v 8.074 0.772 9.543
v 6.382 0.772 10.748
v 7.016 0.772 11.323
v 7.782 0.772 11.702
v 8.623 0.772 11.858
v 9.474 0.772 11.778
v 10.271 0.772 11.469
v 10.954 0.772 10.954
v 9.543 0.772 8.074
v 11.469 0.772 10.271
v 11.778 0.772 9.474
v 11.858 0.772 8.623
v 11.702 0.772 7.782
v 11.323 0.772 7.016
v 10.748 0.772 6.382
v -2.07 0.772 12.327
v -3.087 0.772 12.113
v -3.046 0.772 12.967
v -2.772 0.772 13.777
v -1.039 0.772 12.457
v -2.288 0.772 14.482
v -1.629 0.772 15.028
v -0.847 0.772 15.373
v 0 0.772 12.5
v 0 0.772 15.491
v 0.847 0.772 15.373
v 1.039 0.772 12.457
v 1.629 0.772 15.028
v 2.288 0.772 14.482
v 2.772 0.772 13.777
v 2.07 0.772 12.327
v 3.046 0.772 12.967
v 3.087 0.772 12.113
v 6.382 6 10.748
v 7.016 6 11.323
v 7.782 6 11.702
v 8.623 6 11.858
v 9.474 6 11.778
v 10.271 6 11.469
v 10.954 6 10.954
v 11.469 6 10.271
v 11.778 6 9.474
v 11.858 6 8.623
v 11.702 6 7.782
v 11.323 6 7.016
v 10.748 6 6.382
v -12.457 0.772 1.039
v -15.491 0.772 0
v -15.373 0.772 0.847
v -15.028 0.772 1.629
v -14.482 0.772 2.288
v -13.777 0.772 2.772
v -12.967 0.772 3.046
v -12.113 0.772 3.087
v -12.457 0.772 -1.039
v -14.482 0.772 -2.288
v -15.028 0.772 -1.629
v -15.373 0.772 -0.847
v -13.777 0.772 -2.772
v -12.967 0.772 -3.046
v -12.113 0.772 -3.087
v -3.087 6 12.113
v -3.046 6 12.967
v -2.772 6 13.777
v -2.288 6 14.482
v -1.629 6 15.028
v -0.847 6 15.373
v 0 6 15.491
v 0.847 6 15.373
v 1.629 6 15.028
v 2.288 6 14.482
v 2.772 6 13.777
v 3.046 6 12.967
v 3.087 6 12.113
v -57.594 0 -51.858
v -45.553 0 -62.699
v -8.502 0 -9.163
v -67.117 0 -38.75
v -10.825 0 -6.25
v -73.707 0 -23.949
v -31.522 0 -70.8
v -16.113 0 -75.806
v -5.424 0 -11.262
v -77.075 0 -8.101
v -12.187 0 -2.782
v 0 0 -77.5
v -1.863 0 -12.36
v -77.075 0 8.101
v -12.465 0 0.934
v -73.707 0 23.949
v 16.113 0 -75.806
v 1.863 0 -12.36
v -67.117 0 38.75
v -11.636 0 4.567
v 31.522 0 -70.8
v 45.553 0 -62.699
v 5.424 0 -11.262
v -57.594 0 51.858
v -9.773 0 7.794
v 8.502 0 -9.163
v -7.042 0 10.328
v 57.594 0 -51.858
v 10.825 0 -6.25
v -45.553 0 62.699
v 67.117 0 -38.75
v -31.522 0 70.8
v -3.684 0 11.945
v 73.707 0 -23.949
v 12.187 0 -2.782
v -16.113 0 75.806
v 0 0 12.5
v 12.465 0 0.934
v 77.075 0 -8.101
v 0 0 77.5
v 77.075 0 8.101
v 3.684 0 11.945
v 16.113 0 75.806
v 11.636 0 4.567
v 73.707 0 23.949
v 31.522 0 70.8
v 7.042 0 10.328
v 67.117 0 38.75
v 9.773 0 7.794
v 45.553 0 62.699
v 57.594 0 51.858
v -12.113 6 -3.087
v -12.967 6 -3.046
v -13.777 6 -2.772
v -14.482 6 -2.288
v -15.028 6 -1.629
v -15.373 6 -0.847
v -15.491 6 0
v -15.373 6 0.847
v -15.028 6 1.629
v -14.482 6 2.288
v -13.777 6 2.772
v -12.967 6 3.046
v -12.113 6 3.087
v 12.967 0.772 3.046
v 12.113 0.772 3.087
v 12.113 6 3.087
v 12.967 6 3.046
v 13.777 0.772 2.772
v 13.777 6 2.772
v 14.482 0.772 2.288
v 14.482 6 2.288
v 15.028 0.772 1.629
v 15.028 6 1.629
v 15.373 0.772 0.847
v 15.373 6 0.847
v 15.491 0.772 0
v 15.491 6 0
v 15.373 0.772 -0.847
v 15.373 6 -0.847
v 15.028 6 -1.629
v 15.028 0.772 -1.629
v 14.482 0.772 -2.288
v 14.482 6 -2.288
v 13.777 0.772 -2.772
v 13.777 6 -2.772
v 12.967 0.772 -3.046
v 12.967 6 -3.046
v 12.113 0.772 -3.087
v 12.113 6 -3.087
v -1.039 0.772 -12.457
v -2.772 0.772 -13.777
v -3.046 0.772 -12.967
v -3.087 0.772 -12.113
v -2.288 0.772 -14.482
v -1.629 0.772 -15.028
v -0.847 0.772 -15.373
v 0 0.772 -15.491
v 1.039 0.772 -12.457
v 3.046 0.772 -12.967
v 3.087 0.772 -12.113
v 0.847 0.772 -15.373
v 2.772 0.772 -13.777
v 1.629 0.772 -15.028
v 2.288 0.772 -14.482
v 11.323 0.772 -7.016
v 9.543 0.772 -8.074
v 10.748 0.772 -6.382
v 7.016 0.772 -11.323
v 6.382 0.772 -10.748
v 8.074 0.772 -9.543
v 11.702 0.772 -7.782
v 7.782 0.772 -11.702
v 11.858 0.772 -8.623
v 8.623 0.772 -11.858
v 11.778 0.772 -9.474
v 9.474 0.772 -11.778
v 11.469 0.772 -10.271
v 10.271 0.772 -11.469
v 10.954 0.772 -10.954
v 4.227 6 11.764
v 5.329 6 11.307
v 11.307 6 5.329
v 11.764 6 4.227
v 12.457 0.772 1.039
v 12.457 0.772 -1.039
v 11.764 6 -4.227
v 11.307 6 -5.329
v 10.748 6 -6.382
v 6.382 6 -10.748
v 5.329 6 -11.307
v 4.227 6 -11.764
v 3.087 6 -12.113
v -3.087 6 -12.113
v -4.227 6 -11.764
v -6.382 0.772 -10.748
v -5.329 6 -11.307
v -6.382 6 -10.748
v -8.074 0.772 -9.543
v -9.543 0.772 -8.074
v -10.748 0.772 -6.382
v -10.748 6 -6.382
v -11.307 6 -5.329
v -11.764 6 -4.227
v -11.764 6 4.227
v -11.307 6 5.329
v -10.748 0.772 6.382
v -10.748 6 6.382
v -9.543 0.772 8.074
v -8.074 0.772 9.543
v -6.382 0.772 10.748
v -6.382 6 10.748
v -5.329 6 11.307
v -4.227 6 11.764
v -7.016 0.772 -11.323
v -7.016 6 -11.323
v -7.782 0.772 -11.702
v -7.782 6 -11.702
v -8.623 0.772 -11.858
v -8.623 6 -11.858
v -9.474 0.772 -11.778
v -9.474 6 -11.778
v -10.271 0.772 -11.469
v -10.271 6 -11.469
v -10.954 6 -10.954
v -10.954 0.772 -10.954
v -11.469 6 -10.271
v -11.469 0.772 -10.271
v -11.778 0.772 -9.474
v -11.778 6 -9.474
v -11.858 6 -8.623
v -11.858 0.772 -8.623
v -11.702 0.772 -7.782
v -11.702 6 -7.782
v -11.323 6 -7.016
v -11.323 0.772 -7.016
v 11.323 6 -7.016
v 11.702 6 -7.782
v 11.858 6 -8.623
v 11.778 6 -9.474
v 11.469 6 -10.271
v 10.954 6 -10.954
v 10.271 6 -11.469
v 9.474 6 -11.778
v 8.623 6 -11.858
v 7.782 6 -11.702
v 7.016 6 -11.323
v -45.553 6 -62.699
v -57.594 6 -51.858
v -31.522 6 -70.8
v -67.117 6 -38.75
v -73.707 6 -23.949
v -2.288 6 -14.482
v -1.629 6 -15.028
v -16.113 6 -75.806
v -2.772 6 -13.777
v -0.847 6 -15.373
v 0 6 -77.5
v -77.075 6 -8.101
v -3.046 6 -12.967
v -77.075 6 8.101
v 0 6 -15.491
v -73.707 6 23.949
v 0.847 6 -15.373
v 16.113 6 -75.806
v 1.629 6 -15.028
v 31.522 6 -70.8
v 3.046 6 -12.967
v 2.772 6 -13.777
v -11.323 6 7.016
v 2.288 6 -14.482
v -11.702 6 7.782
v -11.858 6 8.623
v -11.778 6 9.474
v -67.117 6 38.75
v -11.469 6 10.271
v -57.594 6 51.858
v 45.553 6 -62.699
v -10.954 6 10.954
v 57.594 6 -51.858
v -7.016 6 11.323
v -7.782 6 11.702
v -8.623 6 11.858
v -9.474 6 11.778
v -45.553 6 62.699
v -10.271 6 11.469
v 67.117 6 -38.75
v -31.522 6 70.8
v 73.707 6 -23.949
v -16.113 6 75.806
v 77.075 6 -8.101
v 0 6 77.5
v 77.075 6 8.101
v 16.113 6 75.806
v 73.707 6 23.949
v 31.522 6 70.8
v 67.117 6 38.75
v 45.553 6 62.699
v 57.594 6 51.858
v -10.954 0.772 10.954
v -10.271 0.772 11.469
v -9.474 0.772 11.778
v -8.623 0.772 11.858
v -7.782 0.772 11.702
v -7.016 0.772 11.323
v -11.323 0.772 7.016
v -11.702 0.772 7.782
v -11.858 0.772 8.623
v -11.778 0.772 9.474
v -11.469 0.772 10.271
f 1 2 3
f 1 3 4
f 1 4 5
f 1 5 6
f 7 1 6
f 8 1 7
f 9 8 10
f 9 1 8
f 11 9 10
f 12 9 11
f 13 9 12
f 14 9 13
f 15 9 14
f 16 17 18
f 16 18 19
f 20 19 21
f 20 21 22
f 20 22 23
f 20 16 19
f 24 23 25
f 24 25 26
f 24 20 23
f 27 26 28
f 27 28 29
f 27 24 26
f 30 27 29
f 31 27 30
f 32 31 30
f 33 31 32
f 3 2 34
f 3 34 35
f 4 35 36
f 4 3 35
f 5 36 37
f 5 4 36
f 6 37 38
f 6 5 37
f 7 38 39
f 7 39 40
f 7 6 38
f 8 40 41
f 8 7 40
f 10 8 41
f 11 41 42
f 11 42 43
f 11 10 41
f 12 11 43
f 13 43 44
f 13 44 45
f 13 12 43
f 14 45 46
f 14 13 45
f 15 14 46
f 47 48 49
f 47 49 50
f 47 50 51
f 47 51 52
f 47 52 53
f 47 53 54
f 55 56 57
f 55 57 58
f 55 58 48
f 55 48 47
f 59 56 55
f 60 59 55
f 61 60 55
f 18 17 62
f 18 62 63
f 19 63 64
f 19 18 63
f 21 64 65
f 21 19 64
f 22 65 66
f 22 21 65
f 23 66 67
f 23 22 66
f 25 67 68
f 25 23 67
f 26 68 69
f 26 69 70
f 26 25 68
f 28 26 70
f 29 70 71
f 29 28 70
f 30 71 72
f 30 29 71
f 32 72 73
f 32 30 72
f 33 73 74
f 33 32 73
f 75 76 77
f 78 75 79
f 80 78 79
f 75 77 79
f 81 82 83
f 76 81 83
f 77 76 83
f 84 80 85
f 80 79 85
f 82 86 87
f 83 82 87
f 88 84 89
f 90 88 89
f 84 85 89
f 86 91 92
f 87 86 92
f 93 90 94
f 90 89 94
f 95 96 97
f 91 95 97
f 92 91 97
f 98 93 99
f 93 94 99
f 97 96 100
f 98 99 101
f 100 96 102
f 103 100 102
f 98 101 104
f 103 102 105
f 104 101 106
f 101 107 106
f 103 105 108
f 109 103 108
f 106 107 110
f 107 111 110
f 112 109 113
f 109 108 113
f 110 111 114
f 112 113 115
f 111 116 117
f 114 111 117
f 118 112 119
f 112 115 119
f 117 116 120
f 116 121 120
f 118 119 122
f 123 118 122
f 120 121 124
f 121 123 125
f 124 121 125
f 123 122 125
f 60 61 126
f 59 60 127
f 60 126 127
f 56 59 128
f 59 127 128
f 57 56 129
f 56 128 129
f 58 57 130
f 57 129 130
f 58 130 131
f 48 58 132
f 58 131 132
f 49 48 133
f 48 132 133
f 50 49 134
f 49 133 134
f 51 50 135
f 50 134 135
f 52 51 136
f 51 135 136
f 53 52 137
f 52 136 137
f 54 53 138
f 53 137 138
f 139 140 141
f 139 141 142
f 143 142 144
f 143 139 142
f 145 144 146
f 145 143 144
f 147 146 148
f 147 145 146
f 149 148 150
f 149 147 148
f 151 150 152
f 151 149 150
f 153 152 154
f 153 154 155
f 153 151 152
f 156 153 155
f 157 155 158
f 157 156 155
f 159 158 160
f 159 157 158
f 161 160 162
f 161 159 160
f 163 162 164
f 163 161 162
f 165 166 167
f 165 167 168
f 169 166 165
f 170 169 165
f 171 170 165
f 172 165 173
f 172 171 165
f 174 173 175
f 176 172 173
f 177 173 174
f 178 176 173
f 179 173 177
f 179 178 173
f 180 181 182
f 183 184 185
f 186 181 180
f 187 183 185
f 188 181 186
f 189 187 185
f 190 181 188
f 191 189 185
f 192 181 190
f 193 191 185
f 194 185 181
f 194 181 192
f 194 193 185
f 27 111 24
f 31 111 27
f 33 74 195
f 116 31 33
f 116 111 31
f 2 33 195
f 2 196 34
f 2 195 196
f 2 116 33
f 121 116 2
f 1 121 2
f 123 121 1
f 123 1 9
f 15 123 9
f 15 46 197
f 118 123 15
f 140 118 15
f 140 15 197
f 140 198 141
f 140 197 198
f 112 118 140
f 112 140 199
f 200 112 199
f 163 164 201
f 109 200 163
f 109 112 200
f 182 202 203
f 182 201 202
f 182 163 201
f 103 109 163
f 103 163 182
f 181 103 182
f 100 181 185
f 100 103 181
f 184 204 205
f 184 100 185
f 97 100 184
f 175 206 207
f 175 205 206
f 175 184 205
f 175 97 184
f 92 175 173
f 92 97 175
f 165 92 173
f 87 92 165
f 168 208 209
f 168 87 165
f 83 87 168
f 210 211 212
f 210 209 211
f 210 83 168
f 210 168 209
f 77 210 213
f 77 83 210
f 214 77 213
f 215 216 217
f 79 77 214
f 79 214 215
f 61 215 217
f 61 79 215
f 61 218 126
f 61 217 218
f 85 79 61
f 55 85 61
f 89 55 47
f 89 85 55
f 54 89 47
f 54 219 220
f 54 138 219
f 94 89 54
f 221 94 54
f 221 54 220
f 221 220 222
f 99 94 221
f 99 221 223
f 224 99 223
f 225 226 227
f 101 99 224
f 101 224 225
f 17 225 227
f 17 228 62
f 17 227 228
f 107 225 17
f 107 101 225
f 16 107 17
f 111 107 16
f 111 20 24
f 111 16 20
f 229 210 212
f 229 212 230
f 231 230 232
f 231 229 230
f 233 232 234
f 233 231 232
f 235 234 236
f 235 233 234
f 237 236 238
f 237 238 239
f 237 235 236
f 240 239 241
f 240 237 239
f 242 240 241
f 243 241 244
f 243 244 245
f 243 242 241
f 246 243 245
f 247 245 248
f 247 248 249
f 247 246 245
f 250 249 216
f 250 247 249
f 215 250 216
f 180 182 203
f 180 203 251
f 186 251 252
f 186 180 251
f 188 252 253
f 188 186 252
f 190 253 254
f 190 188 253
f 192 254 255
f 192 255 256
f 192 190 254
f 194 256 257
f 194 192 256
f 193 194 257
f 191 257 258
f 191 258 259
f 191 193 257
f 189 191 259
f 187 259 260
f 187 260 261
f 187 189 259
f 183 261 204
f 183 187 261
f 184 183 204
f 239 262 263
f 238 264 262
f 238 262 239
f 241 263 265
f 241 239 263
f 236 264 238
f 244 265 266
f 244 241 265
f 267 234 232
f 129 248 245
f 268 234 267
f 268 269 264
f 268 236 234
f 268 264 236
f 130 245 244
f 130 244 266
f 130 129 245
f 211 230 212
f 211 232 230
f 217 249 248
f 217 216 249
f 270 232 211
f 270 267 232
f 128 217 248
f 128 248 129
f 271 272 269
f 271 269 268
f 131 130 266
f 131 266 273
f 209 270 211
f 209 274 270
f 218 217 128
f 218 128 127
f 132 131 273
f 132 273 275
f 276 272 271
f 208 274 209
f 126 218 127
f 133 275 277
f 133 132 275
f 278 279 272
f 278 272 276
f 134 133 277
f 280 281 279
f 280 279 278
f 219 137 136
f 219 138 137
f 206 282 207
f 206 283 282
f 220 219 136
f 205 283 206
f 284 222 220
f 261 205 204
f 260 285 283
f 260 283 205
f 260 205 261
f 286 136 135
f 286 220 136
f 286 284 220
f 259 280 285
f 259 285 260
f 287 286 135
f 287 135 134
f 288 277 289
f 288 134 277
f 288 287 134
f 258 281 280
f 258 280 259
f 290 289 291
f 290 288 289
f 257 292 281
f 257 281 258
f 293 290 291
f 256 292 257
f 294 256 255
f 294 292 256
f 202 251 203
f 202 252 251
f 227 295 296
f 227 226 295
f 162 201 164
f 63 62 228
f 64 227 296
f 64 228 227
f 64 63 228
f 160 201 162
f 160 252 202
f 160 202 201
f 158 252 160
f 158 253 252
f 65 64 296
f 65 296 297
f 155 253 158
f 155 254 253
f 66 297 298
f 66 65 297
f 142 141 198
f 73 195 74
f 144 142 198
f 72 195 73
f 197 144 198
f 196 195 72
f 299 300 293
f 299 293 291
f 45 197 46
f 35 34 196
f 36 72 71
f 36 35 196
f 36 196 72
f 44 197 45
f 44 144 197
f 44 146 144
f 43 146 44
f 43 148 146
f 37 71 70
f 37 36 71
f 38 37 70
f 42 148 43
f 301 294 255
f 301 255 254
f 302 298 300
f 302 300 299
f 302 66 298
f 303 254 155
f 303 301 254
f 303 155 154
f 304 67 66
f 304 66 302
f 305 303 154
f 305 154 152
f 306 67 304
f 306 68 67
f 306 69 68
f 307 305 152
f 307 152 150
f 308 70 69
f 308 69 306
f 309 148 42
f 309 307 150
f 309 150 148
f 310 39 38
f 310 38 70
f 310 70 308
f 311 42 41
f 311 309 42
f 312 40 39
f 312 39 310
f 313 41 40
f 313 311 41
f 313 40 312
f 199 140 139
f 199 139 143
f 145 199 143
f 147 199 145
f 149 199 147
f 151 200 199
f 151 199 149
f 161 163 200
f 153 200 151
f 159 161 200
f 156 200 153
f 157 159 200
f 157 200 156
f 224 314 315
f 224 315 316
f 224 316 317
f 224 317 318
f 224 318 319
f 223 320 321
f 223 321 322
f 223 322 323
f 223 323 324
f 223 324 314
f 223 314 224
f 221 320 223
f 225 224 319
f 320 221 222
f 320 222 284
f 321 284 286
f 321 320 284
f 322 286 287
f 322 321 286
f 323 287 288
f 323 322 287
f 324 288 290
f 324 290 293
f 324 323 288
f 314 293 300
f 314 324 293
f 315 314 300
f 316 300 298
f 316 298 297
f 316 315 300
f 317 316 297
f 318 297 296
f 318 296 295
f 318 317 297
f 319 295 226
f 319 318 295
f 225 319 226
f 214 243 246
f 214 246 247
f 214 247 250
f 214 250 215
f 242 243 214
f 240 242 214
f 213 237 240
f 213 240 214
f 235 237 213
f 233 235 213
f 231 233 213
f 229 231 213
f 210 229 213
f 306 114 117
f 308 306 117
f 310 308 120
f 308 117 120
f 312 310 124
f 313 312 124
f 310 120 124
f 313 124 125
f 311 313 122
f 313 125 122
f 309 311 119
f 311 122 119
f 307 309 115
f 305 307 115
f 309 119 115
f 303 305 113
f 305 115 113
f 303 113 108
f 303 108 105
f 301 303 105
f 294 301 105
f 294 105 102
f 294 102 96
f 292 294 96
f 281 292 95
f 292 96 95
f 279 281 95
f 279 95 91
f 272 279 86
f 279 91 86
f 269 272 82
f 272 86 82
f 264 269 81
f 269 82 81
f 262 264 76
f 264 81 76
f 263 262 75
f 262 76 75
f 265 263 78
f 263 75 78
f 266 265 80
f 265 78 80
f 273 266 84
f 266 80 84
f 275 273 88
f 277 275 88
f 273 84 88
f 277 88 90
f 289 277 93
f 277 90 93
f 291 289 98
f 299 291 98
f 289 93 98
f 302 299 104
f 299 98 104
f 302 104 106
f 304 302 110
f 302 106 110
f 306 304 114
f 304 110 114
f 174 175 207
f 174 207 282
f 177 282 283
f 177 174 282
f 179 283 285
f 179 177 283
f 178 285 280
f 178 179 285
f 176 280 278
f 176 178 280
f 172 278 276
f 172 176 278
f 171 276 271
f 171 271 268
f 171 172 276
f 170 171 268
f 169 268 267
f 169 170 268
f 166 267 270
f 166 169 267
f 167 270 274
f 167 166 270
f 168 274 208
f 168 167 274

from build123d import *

# Parameters (mm, degrees)
SKETCH1_R           = 77.5
BOSS_EXTRUDE1_DEPTH = 6
SKETCH2_R           = 12.5
CUT_EXTRUDE1_DEPTH  = 110.765659475
SKETCH3_R           = 3.099503232
CUT_EXTRUDE2_DEPTH  = 5.228379038
CIRPATTERN1_COUNT   = 8


with BuildPart() as part:
    # Sketch1 → Boss-Extrude1 (new body)
    with BuildSketch(Plane(origin=(0, 0, 0), x_dir=(1, 0, 0), z_dir=(0, 1, 0))):
        Circle(SKETCH1_R)
    extrude(amount=BOSS_EXTRUDE1_DEPTH)

    # Sketch2 → Cut-Extrude1 (cut, through all)
    with BuildSketch(Plane(origin=(0, 0, 0), x_dir=(1, 0, 0), z_dir=(0, 1, 0))):
        Circle(SKETCH2_R)
    extrude(amount=CUT_EXTRUDE1_DEPTH, mode=Mode.SUBTRACT)

    # Sketch3 → Cut-Extrude2 (cut)
    with BuildSketch(Plane(origin=(0, 6, 0), x_dir=(1, 0, 0), z_dir=(0, 1, 0))):
        with Locations((-12.391135016, 0)):
            Circle(SKETCH3_R)
    cut_extrude2 = extrude(amount=-CUT_EXTRUDE2_DEPTH, mode=Mode.SUBTRACT)

    # CirPattern1: Cut-Extrude2 ×8 about axis
    cirpattern1_axis = Axis((0, 0, 0), (0, 1, 0))
    for i in range(1, CIRPATTERN1_COUNT):
        add(cut_extrude2.rotate(cirpattern1_axis, i * 360 / CIRPATTERN1_COUNT), mode=Mode.SUBTRACT)


solid = part.part
